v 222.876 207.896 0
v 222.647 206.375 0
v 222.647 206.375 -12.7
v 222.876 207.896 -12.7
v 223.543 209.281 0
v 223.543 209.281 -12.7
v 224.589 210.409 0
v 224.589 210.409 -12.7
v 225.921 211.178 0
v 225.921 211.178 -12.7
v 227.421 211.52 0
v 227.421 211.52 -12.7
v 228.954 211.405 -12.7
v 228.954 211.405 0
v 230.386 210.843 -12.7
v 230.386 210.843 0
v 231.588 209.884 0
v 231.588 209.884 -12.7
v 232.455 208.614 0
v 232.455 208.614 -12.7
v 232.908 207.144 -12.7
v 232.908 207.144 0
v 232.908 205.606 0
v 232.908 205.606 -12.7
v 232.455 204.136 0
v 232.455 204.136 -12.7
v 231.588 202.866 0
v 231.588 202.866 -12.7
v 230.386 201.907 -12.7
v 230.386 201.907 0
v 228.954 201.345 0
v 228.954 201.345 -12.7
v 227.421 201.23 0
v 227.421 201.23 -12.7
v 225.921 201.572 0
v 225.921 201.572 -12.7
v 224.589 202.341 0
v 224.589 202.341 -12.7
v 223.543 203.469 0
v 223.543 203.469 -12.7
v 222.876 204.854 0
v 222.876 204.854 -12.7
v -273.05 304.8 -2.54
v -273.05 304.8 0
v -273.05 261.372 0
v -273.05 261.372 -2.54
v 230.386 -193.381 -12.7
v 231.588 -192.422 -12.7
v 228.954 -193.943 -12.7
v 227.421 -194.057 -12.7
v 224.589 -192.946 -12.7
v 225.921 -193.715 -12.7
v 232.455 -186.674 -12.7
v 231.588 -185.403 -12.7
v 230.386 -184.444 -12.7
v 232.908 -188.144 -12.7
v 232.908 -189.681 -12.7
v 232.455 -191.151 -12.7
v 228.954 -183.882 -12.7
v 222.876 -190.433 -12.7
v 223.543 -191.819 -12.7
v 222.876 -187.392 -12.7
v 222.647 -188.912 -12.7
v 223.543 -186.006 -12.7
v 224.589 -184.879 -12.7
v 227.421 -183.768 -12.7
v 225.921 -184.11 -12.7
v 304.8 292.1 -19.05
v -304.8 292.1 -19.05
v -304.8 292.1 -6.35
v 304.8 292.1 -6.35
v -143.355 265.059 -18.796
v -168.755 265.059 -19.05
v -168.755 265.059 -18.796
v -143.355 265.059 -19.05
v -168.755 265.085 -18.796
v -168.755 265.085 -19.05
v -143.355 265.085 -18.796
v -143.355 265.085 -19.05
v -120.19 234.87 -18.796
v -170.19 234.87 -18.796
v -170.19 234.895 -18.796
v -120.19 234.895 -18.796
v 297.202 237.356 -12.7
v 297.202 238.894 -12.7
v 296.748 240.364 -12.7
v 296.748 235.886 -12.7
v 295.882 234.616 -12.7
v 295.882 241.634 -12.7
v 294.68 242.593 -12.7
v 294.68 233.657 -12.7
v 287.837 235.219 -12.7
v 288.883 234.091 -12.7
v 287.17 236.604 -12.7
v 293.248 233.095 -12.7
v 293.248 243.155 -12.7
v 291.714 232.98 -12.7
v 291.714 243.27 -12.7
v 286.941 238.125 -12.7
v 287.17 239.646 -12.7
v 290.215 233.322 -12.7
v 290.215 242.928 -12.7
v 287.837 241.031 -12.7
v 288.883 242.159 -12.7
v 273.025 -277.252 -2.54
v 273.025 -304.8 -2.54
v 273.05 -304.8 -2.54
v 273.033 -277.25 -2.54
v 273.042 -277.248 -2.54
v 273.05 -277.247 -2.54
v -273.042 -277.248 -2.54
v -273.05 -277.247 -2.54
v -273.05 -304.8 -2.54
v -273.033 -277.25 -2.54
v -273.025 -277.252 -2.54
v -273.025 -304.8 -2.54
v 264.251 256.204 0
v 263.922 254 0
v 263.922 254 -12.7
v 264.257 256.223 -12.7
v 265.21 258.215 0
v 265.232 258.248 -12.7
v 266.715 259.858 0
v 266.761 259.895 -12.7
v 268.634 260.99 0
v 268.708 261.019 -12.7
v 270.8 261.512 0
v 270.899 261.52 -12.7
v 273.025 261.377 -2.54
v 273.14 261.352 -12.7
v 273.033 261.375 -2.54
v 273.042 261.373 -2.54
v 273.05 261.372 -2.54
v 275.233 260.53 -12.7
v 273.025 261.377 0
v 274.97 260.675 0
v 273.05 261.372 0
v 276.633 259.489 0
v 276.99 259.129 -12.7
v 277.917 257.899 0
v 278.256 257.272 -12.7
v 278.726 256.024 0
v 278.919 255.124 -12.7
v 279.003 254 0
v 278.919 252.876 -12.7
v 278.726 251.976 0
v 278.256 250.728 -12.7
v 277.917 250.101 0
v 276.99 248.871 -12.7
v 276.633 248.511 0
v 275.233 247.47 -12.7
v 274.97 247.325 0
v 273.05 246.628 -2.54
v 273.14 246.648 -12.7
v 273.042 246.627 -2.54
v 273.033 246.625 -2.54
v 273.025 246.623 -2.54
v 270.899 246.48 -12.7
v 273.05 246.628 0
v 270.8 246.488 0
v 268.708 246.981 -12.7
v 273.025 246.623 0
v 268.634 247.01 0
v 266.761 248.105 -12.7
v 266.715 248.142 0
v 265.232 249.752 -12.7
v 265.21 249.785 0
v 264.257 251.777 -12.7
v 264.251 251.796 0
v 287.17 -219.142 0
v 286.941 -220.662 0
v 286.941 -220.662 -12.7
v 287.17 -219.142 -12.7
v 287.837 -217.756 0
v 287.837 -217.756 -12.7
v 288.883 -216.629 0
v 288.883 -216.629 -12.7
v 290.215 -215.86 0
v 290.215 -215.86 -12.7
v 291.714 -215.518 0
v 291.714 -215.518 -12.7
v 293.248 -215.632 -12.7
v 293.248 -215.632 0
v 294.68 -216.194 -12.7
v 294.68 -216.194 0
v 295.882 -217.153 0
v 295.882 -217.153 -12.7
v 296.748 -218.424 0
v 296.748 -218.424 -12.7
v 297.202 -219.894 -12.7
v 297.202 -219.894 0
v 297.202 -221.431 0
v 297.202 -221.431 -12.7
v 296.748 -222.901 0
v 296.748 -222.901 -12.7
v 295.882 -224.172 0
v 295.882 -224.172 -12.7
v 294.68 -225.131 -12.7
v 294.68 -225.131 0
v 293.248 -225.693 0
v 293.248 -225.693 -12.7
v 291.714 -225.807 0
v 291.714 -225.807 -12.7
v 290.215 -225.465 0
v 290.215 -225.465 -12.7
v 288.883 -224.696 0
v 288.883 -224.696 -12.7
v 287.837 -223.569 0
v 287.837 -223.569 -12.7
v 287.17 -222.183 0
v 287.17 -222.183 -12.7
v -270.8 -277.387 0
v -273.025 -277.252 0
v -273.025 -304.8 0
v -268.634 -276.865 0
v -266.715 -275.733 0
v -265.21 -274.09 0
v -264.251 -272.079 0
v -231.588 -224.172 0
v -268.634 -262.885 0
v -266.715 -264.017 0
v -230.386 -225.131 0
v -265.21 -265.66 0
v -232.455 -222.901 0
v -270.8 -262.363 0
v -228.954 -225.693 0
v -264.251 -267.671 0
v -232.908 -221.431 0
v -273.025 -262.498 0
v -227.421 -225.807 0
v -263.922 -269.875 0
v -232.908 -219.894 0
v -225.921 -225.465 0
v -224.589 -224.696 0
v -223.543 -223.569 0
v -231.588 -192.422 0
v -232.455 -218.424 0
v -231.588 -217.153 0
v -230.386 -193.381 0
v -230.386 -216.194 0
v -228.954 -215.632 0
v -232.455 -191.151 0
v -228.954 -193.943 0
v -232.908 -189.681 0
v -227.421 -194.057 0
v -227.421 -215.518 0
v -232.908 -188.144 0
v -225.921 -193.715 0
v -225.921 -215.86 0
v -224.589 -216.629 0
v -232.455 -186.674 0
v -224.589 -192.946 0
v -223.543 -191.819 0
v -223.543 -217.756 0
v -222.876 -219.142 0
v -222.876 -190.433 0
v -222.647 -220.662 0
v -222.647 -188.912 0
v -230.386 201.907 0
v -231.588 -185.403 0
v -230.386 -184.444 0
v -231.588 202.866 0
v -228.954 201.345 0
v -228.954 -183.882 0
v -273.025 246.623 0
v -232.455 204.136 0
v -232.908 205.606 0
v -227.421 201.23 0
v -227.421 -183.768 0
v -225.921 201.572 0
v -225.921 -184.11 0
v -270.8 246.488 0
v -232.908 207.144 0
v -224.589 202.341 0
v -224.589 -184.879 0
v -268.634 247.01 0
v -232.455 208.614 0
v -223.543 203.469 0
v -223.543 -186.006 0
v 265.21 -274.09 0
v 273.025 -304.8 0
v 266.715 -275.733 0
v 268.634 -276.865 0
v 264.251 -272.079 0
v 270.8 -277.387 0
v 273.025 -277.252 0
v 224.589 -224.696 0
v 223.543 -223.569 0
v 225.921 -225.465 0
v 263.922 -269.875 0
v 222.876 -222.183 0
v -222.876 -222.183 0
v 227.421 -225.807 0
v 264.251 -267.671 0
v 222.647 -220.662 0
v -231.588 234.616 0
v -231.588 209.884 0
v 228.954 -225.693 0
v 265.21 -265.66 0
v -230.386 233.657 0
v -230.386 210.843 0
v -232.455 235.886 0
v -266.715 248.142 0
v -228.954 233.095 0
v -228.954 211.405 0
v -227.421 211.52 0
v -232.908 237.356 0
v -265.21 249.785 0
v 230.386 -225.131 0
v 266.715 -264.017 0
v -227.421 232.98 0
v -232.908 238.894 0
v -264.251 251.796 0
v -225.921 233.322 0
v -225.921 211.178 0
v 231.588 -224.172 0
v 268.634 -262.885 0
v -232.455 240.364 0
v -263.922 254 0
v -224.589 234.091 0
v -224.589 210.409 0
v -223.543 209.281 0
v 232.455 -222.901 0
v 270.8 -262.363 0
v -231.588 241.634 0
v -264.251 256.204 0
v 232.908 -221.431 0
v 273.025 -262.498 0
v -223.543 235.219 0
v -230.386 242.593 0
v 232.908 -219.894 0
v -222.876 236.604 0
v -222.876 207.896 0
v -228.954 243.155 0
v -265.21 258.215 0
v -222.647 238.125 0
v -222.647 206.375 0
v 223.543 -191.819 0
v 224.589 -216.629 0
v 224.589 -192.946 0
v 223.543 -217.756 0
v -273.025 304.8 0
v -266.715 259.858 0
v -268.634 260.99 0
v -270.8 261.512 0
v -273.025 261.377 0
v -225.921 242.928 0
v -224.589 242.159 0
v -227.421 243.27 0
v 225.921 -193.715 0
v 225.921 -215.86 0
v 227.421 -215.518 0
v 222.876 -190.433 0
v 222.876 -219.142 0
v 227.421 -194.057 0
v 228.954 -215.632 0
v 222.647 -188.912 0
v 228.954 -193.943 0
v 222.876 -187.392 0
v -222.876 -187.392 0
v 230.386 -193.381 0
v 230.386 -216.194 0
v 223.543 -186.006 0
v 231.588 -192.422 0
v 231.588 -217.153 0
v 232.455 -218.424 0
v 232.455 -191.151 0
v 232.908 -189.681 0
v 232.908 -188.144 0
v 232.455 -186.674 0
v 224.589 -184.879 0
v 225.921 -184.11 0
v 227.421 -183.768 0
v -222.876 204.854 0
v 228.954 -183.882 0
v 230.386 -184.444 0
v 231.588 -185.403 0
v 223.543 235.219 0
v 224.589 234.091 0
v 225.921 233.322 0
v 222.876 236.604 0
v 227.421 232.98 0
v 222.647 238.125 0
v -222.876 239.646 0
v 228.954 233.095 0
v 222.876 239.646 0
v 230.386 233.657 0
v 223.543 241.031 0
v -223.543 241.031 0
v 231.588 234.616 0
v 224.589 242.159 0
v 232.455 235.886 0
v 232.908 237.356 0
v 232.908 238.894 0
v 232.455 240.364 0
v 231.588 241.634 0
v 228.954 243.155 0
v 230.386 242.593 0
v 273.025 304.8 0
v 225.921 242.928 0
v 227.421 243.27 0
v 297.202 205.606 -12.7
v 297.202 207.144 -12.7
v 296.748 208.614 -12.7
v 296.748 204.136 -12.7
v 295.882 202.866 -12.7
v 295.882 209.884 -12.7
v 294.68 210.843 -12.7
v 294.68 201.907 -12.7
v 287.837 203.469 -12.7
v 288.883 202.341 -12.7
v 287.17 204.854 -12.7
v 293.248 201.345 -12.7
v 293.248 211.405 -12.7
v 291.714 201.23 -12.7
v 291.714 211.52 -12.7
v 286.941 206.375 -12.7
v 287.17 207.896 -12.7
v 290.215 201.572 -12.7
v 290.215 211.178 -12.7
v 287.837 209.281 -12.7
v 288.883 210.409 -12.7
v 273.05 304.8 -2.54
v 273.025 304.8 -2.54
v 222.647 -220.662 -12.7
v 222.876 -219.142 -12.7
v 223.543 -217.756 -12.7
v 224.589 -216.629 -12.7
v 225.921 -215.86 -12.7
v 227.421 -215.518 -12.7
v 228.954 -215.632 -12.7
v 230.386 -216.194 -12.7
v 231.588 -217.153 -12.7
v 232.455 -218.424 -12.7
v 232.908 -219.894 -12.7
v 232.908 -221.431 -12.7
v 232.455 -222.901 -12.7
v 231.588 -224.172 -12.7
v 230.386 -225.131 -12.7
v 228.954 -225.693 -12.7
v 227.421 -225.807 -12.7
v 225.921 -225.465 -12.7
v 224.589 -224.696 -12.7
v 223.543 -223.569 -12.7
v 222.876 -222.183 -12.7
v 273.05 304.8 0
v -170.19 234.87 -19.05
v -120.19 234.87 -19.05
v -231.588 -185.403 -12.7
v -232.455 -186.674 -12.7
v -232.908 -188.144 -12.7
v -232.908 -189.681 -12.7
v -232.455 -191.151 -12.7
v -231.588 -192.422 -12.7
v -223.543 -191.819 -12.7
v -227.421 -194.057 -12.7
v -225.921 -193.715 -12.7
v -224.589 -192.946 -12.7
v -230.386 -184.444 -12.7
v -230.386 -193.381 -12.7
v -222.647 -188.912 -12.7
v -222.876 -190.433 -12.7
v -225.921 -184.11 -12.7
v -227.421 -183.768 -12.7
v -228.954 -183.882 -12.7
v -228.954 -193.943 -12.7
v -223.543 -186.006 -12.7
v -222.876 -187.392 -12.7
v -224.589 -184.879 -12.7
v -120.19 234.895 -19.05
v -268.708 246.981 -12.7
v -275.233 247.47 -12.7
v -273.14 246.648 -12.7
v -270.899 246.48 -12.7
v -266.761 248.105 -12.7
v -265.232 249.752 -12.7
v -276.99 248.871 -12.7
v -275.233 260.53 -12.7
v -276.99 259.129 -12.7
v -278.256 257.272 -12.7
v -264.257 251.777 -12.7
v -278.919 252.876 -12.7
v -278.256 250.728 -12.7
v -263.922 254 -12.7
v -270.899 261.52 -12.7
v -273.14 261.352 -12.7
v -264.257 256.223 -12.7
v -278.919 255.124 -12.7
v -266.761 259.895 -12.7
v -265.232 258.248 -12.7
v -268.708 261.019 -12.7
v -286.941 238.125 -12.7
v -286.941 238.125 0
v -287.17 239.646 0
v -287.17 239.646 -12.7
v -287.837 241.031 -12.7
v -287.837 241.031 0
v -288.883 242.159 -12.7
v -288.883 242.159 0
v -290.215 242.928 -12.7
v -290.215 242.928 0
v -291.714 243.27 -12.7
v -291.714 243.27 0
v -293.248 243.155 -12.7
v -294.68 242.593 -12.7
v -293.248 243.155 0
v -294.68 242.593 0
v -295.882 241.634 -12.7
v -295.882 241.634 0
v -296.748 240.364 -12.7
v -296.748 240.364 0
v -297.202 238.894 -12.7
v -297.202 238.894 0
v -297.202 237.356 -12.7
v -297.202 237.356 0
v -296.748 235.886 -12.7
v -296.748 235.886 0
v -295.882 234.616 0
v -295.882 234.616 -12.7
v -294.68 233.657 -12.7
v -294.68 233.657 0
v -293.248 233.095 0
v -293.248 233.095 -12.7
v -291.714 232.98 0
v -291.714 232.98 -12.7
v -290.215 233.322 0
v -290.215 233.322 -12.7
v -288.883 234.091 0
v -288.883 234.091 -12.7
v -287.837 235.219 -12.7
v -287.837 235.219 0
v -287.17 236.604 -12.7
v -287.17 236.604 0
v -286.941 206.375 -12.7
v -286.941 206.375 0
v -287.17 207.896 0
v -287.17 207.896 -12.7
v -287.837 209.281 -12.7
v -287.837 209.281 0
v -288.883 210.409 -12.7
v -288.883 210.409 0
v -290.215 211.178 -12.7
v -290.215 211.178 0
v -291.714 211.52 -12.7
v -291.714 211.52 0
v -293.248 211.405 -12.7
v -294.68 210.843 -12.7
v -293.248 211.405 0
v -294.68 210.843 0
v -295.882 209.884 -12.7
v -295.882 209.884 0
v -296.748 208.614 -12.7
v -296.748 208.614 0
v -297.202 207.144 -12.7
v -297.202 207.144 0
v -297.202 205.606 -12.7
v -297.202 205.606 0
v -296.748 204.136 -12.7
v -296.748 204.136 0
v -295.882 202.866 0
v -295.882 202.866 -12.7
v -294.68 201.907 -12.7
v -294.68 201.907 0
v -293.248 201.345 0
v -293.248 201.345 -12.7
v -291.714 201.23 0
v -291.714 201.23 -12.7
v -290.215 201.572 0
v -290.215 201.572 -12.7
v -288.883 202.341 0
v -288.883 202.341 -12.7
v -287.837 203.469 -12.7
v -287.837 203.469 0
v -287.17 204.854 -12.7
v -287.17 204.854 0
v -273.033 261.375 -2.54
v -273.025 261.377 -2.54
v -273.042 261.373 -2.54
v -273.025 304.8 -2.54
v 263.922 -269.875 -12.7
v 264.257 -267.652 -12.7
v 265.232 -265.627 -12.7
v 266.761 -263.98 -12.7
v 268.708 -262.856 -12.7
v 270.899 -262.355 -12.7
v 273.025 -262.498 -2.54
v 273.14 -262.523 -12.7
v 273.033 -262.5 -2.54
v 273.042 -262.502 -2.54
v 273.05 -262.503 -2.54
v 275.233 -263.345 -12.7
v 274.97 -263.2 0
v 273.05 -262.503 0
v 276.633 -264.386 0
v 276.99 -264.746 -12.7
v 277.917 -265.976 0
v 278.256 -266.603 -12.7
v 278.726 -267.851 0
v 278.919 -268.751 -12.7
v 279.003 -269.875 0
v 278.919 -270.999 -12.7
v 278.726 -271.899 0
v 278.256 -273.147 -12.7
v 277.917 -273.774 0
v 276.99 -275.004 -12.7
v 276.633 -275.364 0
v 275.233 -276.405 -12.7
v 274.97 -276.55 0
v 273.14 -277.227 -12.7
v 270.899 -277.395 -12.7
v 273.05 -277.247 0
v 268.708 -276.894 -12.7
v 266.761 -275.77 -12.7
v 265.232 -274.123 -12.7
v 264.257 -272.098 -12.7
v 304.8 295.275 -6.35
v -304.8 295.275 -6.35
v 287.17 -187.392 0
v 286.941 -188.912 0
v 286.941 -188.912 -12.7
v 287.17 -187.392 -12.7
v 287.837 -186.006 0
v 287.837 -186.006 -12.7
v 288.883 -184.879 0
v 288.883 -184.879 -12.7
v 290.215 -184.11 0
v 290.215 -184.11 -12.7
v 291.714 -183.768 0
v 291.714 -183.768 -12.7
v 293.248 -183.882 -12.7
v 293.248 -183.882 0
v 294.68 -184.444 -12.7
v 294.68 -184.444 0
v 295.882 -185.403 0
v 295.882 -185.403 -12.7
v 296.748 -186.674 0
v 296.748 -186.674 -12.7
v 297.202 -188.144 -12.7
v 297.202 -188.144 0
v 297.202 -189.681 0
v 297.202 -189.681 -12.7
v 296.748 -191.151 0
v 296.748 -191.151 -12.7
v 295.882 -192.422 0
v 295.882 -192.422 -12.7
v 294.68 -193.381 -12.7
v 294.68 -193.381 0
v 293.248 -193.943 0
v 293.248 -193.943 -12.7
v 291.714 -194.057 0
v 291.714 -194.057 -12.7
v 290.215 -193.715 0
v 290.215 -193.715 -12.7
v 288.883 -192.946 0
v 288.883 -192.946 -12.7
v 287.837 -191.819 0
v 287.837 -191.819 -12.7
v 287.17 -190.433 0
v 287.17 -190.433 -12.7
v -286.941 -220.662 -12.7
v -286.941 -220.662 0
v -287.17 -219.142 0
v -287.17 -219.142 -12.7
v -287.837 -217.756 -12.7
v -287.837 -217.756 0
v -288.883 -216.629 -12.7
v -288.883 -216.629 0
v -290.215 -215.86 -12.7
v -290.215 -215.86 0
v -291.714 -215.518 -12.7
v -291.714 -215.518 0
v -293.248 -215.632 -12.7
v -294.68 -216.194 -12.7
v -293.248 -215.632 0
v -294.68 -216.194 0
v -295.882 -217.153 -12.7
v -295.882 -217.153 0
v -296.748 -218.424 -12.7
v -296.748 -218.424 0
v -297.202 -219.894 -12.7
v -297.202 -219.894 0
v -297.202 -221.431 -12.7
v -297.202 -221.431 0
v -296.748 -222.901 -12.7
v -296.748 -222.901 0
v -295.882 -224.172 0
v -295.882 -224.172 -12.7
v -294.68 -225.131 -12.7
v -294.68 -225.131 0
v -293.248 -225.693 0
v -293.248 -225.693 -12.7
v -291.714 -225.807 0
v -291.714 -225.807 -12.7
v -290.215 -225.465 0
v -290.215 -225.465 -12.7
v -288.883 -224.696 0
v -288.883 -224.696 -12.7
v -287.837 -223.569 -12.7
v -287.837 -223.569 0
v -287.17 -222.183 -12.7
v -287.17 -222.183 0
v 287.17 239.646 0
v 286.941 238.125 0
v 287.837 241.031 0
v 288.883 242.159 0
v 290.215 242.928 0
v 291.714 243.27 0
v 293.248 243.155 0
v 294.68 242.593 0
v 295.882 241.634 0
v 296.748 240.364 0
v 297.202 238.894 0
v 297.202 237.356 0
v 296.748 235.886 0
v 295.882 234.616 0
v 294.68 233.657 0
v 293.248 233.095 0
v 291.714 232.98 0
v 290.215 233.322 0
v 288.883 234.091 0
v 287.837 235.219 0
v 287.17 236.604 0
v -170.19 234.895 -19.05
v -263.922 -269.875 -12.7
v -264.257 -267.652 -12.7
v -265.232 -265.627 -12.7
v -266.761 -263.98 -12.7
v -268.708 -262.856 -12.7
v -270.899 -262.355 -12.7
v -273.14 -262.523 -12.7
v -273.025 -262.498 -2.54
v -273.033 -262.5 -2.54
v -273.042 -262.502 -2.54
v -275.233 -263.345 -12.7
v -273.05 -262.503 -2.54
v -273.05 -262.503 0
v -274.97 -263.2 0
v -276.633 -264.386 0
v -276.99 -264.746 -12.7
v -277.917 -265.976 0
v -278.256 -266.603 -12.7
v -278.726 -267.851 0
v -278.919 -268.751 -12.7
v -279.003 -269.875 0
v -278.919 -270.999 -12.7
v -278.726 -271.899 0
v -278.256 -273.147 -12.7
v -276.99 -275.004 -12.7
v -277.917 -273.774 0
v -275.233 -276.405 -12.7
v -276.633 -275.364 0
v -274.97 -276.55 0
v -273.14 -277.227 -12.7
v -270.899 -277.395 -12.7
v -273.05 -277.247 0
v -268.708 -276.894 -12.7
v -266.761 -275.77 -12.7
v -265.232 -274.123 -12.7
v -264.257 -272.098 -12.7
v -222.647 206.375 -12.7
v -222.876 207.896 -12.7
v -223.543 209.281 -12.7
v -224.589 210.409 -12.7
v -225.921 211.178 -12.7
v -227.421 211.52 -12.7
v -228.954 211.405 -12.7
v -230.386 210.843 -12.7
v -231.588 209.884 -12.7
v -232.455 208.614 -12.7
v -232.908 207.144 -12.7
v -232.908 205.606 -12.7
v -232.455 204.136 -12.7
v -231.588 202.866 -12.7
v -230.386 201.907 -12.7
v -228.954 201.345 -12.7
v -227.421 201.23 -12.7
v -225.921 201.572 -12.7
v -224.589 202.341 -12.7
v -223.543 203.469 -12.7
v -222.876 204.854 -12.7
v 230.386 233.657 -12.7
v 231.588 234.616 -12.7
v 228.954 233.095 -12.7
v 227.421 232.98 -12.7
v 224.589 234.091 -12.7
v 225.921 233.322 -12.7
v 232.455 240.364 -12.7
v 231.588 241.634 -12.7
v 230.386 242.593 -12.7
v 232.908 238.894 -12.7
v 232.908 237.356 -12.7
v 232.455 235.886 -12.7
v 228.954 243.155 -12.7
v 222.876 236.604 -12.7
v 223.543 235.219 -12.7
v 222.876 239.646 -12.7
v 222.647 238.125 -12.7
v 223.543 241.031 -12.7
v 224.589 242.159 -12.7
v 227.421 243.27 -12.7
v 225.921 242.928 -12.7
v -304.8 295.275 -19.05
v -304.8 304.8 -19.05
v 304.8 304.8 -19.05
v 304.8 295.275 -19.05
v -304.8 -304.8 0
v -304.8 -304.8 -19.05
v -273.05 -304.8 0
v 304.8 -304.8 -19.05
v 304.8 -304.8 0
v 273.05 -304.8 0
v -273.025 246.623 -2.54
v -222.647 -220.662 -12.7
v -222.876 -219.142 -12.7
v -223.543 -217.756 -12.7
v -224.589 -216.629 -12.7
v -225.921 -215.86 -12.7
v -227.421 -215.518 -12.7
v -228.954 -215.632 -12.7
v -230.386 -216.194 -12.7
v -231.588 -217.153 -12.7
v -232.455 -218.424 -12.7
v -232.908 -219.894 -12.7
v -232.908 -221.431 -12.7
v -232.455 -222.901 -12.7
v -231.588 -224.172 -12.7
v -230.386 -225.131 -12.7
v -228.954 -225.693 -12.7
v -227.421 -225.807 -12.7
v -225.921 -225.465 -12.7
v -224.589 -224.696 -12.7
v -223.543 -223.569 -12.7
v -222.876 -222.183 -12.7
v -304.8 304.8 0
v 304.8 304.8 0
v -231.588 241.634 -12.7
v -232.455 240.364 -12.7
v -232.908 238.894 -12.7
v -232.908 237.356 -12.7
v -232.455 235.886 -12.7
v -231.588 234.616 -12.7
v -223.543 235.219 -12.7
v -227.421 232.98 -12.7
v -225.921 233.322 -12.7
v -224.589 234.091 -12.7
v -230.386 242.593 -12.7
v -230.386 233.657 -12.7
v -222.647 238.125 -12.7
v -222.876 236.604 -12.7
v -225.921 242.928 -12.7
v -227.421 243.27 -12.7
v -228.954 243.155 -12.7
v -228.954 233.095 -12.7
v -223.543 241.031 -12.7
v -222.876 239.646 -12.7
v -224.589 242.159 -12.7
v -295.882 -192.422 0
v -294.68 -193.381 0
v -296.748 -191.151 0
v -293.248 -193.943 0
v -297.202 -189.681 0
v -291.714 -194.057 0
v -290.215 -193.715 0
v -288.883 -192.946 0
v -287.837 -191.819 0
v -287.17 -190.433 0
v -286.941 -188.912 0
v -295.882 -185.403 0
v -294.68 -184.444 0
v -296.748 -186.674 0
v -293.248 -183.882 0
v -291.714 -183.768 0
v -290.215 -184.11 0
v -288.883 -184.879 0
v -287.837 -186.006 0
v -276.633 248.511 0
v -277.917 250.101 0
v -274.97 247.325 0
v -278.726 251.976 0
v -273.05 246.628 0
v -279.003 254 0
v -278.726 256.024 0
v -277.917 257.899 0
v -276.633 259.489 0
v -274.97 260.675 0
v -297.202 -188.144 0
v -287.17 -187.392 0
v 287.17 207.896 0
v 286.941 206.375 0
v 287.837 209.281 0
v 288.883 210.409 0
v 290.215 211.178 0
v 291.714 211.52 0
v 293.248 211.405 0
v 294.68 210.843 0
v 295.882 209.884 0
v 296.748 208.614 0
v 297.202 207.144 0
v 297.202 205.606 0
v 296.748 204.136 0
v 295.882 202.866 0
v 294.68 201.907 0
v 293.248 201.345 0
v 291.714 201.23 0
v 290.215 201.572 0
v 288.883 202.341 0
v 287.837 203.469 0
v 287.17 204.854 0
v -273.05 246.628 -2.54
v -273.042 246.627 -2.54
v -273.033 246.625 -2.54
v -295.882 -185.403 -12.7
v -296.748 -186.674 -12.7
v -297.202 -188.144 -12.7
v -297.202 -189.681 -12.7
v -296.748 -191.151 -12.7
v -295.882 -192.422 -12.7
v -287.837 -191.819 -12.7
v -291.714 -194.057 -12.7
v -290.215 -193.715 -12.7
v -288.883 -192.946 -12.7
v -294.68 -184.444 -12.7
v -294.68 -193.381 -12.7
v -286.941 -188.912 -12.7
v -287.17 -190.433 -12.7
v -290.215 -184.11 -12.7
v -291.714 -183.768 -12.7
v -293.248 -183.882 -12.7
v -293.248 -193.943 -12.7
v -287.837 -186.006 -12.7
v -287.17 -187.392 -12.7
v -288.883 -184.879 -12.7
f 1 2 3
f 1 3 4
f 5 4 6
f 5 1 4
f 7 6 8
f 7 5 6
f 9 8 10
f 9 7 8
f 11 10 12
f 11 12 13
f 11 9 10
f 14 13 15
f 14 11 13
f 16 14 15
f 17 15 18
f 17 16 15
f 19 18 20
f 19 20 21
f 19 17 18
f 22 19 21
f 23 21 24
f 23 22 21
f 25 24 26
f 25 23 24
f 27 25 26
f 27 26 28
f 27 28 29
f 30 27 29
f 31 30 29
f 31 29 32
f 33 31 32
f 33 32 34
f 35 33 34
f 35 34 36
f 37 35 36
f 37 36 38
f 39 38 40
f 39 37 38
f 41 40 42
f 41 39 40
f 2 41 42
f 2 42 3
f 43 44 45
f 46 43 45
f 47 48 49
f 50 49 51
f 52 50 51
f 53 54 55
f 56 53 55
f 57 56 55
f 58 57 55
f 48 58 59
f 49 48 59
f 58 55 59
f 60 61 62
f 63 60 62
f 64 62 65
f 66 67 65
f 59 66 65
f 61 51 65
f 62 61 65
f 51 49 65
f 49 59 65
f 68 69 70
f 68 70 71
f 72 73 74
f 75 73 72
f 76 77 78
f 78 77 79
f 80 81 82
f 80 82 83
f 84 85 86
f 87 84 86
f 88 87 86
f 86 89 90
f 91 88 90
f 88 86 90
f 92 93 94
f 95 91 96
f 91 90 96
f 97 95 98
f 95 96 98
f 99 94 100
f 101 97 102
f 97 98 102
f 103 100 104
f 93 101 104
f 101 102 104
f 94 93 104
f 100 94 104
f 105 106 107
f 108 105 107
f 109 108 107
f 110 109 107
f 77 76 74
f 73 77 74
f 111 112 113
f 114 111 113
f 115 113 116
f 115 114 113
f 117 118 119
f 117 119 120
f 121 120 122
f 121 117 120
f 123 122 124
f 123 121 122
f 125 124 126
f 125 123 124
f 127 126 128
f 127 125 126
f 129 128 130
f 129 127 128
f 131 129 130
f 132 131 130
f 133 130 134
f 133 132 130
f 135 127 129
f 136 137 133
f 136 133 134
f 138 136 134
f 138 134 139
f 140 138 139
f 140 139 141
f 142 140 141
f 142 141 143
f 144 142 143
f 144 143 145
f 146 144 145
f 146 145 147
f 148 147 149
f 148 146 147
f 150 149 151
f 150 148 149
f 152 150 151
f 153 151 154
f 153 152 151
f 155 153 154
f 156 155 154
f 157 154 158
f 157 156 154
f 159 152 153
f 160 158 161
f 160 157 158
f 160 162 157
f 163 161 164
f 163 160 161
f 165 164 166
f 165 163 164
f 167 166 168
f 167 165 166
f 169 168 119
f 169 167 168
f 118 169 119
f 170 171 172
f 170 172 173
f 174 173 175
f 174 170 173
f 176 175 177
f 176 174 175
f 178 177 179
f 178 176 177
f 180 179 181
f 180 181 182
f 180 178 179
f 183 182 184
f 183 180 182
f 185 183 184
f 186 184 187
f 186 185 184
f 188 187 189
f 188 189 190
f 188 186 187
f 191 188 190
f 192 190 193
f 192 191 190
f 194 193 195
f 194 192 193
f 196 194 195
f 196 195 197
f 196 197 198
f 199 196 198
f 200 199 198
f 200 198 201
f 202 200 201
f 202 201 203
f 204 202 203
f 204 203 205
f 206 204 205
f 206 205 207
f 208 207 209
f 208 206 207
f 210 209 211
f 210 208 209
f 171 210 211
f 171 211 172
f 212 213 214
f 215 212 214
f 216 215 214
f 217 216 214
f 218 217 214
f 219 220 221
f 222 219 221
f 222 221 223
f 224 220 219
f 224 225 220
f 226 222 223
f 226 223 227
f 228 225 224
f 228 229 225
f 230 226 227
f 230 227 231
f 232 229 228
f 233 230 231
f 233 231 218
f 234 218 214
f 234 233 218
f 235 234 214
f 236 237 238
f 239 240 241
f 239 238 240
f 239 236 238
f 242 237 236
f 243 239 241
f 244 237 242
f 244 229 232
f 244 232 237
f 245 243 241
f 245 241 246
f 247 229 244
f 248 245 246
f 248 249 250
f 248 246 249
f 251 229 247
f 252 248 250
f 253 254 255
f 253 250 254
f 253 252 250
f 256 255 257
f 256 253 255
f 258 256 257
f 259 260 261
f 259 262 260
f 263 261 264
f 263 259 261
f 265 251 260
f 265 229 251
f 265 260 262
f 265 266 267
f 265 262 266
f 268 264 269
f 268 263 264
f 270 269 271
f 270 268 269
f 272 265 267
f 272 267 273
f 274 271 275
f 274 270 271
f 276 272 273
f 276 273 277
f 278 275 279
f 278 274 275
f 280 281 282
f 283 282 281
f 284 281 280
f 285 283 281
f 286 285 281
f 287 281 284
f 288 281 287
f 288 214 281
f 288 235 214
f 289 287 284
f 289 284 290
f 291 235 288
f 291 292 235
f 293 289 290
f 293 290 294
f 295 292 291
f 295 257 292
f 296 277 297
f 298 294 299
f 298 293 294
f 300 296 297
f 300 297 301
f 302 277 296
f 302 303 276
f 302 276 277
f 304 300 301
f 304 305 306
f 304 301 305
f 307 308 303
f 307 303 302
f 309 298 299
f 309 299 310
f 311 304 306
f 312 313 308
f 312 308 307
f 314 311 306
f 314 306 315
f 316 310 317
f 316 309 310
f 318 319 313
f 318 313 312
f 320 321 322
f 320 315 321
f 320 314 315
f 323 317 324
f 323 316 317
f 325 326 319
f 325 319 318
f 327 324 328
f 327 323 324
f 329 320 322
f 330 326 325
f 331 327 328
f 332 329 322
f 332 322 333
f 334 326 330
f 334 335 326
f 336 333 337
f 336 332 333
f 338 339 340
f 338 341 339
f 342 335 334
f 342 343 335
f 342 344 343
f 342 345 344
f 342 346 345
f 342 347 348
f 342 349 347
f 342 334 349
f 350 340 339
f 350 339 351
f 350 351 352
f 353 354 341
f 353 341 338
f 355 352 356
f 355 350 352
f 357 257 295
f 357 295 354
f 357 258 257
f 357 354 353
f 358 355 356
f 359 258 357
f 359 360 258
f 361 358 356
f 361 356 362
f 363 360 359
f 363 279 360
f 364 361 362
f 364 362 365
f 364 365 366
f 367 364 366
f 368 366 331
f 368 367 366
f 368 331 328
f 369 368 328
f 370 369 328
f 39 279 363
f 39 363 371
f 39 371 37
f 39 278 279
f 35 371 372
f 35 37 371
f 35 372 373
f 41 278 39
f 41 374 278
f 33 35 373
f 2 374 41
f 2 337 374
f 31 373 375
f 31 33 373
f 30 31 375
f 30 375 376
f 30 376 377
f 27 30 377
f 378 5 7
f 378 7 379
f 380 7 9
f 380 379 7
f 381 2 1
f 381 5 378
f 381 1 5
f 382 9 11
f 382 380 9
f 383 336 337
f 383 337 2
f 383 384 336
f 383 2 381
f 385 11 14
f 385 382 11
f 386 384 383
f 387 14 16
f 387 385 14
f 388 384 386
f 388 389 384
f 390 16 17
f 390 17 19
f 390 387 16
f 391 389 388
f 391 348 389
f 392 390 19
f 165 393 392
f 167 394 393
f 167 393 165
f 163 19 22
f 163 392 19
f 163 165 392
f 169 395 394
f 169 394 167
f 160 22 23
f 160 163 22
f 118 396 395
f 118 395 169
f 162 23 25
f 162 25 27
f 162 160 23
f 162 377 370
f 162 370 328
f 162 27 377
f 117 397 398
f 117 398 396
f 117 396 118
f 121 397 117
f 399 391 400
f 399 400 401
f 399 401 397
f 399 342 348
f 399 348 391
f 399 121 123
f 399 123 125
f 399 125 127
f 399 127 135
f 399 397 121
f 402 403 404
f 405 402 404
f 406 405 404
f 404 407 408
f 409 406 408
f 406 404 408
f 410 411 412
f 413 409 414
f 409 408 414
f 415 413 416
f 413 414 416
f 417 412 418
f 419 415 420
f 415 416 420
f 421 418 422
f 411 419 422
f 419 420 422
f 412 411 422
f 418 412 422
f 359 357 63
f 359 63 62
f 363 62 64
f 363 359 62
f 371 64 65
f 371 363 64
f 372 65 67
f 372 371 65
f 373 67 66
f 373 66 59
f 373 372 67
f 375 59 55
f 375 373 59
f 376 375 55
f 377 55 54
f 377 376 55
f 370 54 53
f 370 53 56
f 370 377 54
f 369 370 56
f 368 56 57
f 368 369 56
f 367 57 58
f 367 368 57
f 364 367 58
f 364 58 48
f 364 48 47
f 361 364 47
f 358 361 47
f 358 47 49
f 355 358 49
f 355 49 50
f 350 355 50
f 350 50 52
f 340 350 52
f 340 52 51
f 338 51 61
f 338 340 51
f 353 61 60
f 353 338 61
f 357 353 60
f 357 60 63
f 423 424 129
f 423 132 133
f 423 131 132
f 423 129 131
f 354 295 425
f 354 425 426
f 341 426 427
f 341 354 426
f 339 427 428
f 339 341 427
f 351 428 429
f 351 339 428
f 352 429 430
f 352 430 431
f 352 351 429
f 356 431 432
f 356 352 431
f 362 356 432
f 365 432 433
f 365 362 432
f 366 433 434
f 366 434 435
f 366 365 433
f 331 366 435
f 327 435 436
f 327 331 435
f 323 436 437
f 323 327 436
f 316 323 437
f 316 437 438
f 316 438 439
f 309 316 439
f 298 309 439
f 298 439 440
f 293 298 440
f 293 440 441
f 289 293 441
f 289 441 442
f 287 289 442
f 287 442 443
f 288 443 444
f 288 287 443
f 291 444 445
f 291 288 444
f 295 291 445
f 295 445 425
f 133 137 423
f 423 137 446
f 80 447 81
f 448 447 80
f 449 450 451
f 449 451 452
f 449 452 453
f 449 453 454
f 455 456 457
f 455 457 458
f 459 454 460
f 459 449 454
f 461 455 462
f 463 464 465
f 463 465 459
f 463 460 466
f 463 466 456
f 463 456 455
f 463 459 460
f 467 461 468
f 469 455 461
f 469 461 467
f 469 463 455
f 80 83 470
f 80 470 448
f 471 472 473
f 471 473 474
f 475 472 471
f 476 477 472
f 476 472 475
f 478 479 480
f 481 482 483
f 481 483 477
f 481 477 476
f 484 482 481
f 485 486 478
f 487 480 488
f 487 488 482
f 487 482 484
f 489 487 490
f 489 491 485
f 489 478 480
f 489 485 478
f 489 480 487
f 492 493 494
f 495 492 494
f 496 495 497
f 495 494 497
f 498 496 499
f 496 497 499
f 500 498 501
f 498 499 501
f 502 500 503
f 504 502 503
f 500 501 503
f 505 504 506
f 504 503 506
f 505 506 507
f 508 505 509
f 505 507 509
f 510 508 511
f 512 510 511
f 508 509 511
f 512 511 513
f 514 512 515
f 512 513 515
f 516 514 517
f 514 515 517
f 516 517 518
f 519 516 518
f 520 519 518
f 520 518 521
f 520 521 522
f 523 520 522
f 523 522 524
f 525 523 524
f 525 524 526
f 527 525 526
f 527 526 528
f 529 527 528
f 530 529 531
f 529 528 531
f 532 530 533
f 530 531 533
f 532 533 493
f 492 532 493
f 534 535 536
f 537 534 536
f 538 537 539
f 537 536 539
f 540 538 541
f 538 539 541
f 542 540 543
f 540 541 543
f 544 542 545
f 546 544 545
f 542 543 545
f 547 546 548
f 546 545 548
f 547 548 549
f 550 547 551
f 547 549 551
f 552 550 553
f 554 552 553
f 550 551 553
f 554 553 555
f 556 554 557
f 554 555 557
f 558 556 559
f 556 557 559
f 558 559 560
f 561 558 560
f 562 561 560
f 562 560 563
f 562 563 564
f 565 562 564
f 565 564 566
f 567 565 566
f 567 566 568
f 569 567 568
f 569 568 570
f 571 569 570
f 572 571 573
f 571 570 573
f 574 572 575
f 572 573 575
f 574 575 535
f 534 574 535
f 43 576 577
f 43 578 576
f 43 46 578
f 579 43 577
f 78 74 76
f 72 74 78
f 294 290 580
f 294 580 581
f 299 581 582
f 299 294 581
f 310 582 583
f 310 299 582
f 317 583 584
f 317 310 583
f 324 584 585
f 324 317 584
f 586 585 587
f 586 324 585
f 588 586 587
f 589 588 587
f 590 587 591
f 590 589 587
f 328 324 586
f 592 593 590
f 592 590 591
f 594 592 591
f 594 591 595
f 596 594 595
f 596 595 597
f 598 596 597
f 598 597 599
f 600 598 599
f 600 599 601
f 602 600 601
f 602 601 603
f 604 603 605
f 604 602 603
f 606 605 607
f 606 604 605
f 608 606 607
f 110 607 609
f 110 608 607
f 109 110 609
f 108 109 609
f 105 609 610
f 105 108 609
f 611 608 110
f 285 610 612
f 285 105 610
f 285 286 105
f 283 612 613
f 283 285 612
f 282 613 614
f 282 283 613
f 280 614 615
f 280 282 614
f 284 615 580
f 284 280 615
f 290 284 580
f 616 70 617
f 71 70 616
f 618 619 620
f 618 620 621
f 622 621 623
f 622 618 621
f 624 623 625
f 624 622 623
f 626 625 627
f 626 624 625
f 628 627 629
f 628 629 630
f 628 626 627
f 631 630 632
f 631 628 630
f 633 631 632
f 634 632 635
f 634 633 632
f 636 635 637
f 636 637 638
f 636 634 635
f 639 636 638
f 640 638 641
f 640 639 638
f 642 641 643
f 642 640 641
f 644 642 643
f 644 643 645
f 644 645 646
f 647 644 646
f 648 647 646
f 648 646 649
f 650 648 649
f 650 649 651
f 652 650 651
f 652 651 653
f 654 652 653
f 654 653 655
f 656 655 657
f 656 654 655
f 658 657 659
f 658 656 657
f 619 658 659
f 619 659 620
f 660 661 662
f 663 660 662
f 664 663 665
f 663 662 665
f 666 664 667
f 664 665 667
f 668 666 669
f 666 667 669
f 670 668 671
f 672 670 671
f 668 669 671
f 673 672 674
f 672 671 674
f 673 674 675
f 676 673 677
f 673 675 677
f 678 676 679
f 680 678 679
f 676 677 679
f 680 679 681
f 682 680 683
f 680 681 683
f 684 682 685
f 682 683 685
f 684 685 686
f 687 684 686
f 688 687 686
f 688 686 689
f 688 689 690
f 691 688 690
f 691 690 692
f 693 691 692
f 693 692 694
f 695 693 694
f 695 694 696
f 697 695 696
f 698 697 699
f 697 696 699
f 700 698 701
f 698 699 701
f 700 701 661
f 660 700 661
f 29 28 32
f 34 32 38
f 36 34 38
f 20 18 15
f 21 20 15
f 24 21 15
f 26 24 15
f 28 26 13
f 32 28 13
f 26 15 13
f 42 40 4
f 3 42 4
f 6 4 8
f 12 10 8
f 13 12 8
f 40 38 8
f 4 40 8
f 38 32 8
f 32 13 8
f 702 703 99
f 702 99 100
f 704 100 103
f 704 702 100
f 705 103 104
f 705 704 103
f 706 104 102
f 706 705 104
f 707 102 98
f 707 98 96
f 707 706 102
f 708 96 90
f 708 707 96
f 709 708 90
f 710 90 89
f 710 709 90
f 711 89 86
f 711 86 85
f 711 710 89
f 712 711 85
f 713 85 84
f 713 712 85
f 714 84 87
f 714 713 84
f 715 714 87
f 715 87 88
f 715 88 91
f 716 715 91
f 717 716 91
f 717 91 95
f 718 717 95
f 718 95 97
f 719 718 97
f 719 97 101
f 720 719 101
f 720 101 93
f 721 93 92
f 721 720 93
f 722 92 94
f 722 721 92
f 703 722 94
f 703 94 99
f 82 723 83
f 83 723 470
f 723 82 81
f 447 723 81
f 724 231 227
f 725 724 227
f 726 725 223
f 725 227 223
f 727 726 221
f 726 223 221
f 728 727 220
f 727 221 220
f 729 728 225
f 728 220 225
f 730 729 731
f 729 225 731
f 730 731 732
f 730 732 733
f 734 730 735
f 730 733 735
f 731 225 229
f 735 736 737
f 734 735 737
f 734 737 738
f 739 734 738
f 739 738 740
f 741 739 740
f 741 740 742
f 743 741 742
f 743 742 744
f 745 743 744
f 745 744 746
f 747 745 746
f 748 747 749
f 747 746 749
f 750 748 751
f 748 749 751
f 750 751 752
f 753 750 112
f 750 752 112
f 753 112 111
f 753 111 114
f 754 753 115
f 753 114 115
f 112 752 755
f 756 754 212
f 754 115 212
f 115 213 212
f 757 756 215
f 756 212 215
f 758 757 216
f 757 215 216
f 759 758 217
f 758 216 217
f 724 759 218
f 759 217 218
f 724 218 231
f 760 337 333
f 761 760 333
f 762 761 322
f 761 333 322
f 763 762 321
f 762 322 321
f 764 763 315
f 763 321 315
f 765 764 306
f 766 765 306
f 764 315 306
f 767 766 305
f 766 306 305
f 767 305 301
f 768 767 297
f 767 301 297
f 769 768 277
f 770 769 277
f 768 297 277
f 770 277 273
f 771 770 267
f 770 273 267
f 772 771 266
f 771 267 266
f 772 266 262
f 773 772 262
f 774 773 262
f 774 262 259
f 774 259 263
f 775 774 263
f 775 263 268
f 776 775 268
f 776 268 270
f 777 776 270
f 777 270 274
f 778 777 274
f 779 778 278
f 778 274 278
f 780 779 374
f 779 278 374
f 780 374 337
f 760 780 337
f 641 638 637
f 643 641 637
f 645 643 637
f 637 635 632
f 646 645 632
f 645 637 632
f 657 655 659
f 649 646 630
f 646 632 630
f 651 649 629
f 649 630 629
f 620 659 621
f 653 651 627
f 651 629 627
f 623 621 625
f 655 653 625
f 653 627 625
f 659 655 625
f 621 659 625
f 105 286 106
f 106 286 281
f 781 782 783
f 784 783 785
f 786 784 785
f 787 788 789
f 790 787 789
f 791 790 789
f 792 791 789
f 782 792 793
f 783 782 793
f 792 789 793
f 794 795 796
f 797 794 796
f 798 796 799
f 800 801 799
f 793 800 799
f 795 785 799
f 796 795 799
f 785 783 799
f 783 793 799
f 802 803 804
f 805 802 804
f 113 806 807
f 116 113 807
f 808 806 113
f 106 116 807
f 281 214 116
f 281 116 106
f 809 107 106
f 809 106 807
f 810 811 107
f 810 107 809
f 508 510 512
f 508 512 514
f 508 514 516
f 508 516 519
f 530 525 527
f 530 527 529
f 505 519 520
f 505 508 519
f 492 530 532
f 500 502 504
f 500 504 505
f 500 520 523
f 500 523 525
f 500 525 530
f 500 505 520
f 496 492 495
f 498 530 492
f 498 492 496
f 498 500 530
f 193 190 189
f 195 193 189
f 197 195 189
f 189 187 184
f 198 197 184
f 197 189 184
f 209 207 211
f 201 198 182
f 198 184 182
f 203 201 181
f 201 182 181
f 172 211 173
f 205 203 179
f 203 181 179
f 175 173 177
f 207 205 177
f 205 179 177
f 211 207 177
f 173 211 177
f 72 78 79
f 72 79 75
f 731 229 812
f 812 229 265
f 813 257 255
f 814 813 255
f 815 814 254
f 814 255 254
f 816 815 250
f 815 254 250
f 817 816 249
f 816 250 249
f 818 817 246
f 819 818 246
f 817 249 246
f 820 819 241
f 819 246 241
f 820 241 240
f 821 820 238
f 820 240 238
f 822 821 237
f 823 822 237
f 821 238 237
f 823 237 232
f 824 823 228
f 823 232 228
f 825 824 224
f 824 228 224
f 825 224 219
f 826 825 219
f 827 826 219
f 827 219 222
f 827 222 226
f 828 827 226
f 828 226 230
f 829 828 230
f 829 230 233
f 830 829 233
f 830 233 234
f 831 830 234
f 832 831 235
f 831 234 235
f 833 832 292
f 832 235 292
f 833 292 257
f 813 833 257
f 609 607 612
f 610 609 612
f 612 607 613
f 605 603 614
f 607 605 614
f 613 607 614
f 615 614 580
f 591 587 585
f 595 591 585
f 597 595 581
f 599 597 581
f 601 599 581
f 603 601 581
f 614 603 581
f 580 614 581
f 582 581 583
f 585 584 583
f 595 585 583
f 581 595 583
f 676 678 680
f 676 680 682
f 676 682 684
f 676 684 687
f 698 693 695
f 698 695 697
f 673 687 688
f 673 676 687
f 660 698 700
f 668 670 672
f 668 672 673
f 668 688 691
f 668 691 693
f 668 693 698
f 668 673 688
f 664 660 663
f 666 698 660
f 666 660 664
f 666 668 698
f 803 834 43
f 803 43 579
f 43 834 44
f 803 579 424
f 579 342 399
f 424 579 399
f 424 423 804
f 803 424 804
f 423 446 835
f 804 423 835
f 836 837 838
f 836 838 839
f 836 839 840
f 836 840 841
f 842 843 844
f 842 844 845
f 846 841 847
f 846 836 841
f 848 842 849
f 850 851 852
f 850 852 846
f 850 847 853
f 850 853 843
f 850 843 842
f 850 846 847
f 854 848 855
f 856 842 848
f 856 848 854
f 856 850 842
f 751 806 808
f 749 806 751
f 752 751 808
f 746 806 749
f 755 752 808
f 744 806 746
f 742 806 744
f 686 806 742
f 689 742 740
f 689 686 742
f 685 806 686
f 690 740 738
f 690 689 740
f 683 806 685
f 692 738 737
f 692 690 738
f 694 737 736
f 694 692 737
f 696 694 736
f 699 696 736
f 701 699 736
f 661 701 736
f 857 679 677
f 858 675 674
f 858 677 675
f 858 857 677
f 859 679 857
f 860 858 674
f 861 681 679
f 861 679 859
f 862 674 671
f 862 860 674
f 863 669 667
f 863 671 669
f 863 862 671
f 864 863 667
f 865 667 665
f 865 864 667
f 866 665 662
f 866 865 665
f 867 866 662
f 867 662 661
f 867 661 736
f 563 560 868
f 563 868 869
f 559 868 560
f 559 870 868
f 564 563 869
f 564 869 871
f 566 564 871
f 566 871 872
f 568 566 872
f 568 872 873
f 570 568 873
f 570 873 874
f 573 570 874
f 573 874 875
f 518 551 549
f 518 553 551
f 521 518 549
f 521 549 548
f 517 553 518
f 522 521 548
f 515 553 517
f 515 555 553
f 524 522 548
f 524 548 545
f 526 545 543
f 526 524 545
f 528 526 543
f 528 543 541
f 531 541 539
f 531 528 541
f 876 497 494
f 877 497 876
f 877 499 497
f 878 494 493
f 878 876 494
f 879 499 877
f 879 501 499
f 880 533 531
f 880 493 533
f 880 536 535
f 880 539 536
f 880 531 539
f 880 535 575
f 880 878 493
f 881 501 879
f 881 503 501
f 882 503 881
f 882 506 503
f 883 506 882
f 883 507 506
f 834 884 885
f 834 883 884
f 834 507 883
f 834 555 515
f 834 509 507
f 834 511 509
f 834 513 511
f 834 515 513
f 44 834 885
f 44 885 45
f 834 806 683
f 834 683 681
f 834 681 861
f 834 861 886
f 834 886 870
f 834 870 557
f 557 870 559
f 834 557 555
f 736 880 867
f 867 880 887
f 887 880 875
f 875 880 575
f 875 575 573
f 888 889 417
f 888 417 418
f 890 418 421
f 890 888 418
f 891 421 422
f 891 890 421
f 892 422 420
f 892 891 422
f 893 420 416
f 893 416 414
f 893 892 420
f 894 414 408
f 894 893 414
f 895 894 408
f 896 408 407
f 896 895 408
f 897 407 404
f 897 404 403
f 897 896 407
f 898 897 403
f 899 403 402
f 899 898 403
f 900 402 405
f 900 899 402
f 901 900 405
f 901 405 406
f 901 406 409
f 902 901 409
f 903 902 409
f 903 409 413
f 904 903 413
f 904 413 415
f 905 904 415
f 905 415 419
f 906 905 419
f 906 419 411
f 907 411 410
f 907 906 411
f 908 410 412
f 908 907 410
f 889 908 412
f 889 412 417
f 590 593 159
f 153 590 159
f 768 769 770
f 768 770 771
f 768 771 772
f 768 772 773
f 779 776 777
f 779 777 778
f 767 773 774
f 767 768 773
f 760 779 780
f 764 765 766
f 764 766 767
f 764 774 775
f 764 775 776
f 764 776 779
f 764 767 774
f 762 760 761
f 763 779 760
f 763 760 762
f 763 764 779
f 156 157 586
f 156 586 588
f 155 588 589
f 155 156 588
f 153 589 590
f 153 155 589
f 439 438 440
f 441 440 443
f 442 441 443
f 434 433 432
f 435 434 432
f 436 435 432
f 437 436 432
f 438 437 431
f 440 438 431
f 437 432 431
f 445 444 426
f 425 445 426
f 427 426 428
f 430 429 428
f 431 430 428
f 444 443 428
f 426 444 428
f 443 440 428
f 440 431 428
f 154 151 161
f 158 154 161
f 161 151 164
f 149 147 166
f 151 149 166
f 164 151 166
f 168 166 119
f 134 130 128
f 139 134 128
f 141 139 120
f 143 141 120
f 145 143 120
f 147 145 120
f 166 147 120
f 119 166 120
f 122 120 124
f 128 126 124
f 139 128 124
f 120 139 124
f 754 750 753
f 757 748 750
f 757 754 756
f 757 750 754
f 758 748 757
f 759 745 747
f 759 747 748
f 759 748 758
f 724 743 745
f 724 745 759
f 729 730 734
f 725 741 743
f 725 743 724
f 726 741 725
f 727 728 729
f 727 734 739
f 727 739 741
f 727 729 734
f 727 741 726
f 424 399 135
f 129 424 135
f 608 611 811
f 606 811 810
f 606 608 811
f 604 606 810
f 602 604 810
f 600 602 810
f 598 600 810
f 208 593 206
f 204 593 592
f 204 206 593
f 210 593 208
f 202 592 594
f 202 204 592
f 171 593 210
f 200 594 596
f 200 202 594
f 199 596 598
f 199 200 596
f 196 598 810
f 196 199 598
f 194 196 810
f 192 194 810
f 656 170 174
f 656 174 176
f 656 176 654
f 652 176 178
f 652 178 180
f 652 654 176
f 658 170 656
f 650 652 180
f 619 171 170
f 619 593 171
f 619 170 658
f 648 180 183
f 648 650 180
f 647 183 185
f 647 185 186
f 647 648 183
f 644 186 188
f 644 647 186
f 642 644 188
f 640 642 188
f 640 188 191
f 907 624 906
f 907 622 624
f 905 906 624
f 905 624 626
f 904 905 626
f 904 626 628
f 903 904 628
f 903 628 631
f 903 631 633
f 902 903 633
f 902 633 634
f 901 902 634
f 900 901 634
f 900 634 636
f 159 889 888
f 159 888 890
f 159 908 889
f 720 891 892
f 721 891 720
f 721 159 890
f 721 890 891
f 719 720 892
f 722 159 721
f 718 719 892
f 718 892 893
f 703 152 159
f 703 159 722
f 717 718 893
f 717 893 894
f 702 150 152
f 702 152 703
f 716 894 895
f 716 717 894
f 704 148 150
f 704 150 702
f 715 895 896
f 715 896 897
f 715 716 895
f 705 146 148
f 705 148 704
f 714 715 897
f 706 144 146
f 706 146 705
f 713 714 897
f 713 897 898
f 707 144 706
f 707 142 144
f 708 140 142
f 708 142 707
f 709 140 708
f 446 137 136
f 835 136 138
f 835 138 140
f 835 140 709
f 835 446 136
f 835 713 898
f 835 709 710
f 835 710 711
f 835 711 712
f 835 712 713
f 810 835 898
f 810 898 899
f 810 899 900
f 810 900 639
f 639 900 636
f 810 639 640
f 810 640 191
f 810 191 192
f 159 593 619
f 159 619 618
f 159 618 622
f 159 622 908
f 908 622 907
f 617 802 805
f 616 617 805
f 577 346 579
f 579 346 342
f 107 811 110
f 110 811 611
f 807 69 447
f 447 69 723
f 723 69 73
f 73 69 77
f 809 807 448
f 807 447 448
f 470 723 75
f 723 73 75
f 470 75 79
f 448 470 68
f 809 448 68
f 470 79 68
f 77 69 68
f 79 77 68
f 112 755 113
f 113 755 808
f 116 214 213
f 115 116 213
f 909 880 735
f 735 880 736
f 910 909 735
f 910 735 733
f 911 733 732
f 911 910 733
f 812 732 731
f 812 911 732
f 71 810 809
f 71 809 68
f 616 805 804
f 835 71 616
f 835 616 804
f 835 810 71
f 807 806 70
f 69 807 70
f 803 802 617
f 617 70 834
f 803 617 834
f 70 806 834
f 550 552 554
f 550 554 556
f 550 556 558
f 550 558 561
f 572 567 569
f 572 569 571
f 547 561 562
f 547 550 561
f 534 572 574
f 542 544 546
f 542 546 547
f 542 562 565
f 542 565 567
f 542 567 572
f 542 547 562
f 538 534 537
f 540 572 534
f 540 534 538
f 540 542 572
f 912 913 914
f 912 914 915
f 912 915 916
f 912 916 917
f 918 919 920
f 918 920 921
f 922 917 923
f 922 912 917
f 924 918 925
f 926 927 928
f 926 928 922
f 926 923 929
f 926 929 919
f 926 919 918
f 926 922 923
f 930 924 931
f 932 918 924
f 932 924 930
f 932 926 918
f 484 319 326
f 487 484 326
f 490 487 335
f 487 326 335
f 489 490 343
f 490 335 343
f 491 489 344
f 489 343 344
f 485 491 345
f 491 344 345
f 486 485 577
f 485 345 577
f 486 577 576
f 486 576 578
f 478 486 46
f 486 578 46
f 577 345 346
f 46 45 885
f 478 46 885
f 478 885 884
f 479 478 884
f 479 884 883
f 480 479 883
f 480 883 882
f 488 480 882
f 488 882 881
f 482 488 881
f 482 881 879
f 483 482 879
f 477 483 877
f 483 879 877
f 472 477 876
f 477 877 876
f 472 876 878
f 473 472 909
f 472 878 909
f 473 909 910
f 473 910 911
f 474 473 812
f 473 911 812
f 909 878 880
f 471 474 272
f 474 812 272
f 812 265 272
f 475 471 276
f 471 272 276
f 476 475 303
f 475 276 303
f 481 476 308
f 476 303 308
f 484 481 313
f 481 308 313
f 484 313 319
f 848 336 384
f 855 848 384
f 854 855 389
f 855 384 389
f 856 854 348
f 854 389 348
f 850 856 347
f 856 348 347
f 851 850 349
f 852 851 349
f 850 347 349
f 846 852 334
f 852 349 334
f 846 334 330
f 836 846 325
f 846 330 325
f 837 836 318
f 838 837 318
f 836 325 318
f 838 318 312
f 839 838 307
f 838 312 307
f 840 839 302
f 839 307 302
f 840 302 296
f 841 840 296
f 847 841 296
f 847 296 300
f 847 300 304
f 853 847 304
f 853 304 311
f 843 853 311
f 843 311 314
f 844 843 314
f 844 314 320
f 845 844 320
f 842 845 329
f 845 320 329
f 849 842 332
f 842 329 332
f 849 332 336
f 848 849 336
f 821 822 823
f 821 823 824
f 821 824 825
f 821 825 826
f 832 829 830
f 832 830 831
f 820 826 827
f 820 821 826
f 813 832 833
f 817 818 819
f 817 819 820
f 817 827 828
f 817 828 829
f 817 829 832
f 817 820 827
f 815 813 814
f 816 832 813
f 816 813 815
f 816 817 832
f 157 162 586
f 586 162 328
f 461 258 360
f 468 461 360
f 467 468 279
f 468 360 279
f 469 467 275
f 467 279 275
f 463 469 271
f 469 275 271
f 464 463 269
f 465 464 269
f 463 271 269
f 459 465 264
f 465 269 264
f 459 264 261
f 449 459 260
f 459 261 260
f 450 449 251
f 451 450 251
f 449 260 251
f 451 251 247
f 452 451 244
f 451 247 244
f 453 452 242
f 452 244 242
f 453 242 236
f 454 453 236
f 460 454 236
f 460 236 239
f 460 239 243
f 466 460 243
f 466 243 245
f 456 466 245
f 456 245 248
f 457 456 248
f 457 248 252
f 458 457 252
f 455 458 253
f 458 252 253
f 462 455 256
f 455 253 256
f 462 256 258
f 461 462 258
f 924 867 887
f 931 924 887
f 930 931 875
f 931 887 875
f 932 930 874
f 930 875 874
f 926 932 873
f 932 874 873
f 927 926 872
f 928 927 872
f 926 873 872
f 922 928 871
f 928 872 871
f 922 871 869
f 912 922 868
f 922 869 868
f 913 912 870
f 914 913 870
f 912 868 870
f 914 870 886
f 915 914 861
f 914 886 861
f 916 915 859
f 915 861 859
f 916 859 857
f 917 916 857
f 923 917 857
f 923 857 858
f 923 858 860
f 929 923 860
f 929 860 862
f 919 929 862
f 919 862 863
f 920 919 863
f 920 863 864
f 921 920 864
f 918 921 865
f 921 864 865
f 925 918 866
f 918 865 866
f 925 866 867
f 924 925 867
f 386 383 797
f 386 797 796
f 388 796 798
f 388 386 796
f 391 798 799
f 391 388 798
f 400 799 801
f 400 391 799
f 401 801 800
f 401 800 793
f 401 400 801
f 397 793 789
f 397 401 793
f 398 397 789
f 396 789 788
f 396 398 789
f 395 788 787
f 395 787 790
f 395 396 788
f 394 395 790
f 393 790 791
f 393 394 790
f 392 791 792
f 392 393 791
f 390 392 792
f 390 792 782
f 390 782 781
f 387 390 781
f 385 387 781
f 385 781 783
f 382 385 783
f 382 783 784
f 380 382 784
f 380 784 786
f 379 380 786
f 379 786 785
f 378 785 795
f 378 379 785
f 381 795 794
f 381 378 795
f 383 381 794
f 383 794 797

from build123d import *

# Parameters (mm, degrees)
F0_W     = 609.6
F0_H     = 609.6
F0_R     = 7.540625
F0_R_2   = 5.159375
F1_DEPTH = 19.05
F2_DEPTH = 12.7
F3_W     = 609.6
F3_H     = 3.175
F4_DEPTH = 12.7
F5_W     = 25.4
F5_H     = 0.0254
F5_W_2   = 50
F6_DEPTH = 0.254
F8_DEPTH = 2.54


# Not quite as in the source:
# - a pattern or mirror of a feature is missing from the dataset's text; its kind, count and spacing are read off the source's solid
# - a feature names something its author has since deleted; it is built from what else it names


with BuildPart() as f1:
    # F0 (on Top) → F1 (new body)
    with BuildSketch(Plane.XY):
        Rectangle(F0_W, F0_H)
        with Locations((-271.4625, -269.875)):
            Circle(F0_R, mode=Mode.SUBTRACT)
        with Locations((-292.1, -220.6625)):
            Circle(F0_R_2, mode=Mode.SUBTRACT)
        with Locations((-292.1, -188.9125)):
            Circle(F0_R_2, mode=Mode.SUBTRACT)
        with Locations((-227.80625, -220.6625)):
            Circle(F0_R_2, mode=Mode.SUBTRACT)
        with Locations((-227.80625, -188.9125)):
            Circle(F0_R_2, mode=Mode.SUBTRACT)
        with Locations((-292.1, 206.375)):
            Circle(F0_R_2, mode=Mode.SUBTRACT)
        with Locations((-227.80625, 206.375)):
            Circle(F0_R_2, mode=Mode.SUBTRACT)
        with Locations((-292.1, 238.125)):
            Circle(F0_R_2, mode=Mode.SUBTRACT)
        with Locations((-271.4625, 254)):
            Circle(F0_R, mode=Mode.SUBTRACT)
        with Locations((-227.80625, 238.125)):
            Circle(F0_R_2, mode=Mode.SUBTRACT)
        with Locations((-227.80625, 206.375)):
            Circle(F0_R_2)
        with Locations((-227.80625, 238.125)):
            Circle(F0_R_2)
        with Locations((-227.80625, -188.9125)):
            Circle(F0_R_2)
        with Locations((-227.80625, -220.6625)):
            Circle(F0_R_2)
        with Locations((-271.4625, -269.875)):
            Circle(F0_R)
        with Locations((-271.4625, 254)):
            Circle(F0_R)
        with Locations((-292.1, 238.125)):
            Circle(F0_R_2)
        with Locations((-292.1, 206.375)):
            Circle(F0_R_2)
        with Locations((-292.1, -220.6625)):
            Circle(F0_R_2)
        with Locations((-292.1, -188.9125)):
            Circle(F0_R_2)
    extrude(amount=-F1_DEPTH)

    # F0 (on Top) → F2 (cut)
    with BuildSketch(Plane.XY):
        with Locations((-271.4625, -269.875)):
            Circle(F0_R)
        with Locations((-292.1, -220.6625)):
            Circle(F0_R_2)
        with Locations((-227.80625, -220.6625)):
            Circle(F0_R_2)
        with Locations((-227.80625, -188.9125)):
            Circle(F0_R_2)
        with Locations((-292.1, -188.9125)):
            Circle(F0_R_2)
        with Locations((-292.1, 206.375)):
            Circle(F0_R_2)
        with Locations((-227.80625, 206.375)):
            Circle(F0_R_2)
        with Locations((-227.80625, 238.125)):
            Circle(F0_R_2)
        with Locations((-292.1, 238.125)):
            Circle(F0_R_2)
        with Locations((-271.4625, 254)):
            Circle(F0_R)
    f2 = extrude(amount=-F2_DEPTH, mode=Mode.SUBTRACT)

    # F2_copies: F2 across plane
    add(f2.mirror(Plane(origin=(0, 0, 0), x_dir=(0, 0, 1), z_dir=(1, 0, 0))), mode=Mode.SUBTRACT)

    # F3 (on face) → F4 (cut)
    with BuildSketch(Plane(origin=(0, 0, -19.05), x_dir=(1, 0, 0), z_dir=(0, 0, -1))):
        with Locations((0, -293.6875)):
            Rectangle(F3_W, F3_H)
    extrude(amount=-F4_DEPTH, mode=Mode.SUBTRACT)

    # F5 (on face) → F6 (cut)
    with BuildSketch(Plane(origin=(0, 0, -19.05), x_dir=(1, 0, 0), z_dir=(0, 0, -1))):
        with Locations((-156.0546457767, -265.0721735465)):
            Rectangle(F5_W, F5_H)
        with Locations((-145.1898425817, -234.882380328)):
            Rectangle(F5_W_2, F5_H)
    extrude(amount=-F6_DEPTH, mode=Mode.SUBTRACT)

    # F7 (on face) → F8 (cut)
    with BuildSketch(Plane.XY):
        with BuildLine():
            Line((273.05, 304.8), (273.0246, 304.8))
            Line((273.0246, 304.8), (273.0246, 261.3770501544))
            ThreePointArc((273.0246, 261.3770501544), (273.0373023354, 261.3743489879), (273.05, 261.3716259496))
            Line((273.05, 261.3716259496), (273.05, 304.8))
        make_face()
        with BuildLine():
            ThreePointArc((273.05, 261.3716259496), (273.0373023354, 261.3743489879), (273.0246, 261.3770501544))
            Line((273.0246, 261.3770501544), (273.0246, 246.6229498456))
            ThreePointArc((273.0246, 246.6229498456), (273.0373023354, 246.6256510121), (273.05, 246.6283740504))
            Line((273.05, 246.6283740504), (273.05, 261.3716259496))
        make_face()
        with BuildLine():
            ThreePointArc((273.05, 246.6283740504), (273.0373023354, 246.6256510121), (273.0246, 246.6229498456))
            Line((273.0246, 246.6229498456), (273.0246, -262.4979498456))
            ThreePointArc((273.0246, -262.4979498456), (273.0373023354, -262.5006510121), (273.05, -262.5033740504))
            Line((273.05, -262.5033740504), (273.05, 246.6283740504))
        make_face()
        with BuildLine():
            ThreePointArc((273.05, -262.5033740504), (273.0373023354, -262.5006510121), (273.0246, -262.4979498456))
            Line((273.0246, -262.4979498456), (273.0246, -277.2520501544))
            ThreePointArc((273.0246, -277.2520501544), (273.0373023354, -277.2493489879), (273.05, -277.2466259496))
            Line((273.05, -277.2466259496), (273.05, -262.5033740504))
        make_face()
        with BuildLine():
            Line((273.0246, -277.2520501544), (273.0246, -304.8))
            Line((273.0246, -304.8), (273.05, -304.8))
            Line((273.05, -304.8), (273.05, -277.2466259496))
            ThreePointArc((273.05, -277.2466259496), (273.0373023354, -277.2493489879), (273.0246, -277.2520501544))
        make_face()
        with BuildLine():
            Line((-273.0246, 304.8), (-273.05, 304.8))
            Line((-273.05, 304.8), (-273.05, 261.3716259496))
            ThreePointArc((-273.05, 261.3716259496), (-273.0373023354, 261.3743489879), (-273.0246, 261.3770501544))
            Line((-273.0246, 261.3770501544), (-273.0246, 304.8))
        make_face()
        with BuildLine():
            ThreePointArc((-273.0246, 261.3770501544), (-273.0373023354, 261.3743489879), (-273.05, 261.3716259496))
            Line((-273.05, 261.3716259496), (-273.05, 246.6283740504))
            ThreePointArc((-273.05, 246.6283740504), (-273.0373023354, 246.6256510121), (-273.0246, 246.6229498456))
            Line((-273.0246, 246.6229498456), (-273.0246, 261.3770501544))
        make_face()
        with BuildLine():
            ThreePointArc((-273.0246, -262.4979498456), (-273.0373023354, -262.5006510121), (-273.05, -262.5033740504))
            Line((-273.05, -262.5033740504), (-273.05, -277.2466259496))
            ThreePointArc((-273.05, -277.2466259496), (-273.0373023354, -277.2493489879), (-273.0246, -277.2520501544))
            Line((-273.0246, -277.2520501544), (-273.0246, -262.4979498456))
        make_face()
        with BuildLine():
            Line((-273.05, -277.2466259496), (-273.05, -304.8))
            Line((-273.05, -304.8), (-273.0246, -304.8))
            Line((-273.0246, -304.8), (-273.0246, -277.2520501544))
            ThreePointArc((-273.0246, -277.2520501544), (-273.0373023354, -277.2493489879), (-273.05, -277.2466259496))
        make_face()
        with BuildLine():
            ThreePointArc((-273.0246, 246.6229498456), (-273.0373023354, 246.6256510121), (-273.05, 246.6283740504))
            Line((-273.05, 246.6283740504), (-273.05, -262.5033740504))
            ThreePointArc((-273.05, -262.5033740504), (-273.0373023354, -262.5006510121), (-273.0246, -262.4979498456))
            Line((-273.0246, -262.4979498456), (-273.0246, 246.6229498456))
        make_face()
    extrude(amount=-F8_DEPTH, mode=Mode.SUBTRACT)


solid = f1.part
